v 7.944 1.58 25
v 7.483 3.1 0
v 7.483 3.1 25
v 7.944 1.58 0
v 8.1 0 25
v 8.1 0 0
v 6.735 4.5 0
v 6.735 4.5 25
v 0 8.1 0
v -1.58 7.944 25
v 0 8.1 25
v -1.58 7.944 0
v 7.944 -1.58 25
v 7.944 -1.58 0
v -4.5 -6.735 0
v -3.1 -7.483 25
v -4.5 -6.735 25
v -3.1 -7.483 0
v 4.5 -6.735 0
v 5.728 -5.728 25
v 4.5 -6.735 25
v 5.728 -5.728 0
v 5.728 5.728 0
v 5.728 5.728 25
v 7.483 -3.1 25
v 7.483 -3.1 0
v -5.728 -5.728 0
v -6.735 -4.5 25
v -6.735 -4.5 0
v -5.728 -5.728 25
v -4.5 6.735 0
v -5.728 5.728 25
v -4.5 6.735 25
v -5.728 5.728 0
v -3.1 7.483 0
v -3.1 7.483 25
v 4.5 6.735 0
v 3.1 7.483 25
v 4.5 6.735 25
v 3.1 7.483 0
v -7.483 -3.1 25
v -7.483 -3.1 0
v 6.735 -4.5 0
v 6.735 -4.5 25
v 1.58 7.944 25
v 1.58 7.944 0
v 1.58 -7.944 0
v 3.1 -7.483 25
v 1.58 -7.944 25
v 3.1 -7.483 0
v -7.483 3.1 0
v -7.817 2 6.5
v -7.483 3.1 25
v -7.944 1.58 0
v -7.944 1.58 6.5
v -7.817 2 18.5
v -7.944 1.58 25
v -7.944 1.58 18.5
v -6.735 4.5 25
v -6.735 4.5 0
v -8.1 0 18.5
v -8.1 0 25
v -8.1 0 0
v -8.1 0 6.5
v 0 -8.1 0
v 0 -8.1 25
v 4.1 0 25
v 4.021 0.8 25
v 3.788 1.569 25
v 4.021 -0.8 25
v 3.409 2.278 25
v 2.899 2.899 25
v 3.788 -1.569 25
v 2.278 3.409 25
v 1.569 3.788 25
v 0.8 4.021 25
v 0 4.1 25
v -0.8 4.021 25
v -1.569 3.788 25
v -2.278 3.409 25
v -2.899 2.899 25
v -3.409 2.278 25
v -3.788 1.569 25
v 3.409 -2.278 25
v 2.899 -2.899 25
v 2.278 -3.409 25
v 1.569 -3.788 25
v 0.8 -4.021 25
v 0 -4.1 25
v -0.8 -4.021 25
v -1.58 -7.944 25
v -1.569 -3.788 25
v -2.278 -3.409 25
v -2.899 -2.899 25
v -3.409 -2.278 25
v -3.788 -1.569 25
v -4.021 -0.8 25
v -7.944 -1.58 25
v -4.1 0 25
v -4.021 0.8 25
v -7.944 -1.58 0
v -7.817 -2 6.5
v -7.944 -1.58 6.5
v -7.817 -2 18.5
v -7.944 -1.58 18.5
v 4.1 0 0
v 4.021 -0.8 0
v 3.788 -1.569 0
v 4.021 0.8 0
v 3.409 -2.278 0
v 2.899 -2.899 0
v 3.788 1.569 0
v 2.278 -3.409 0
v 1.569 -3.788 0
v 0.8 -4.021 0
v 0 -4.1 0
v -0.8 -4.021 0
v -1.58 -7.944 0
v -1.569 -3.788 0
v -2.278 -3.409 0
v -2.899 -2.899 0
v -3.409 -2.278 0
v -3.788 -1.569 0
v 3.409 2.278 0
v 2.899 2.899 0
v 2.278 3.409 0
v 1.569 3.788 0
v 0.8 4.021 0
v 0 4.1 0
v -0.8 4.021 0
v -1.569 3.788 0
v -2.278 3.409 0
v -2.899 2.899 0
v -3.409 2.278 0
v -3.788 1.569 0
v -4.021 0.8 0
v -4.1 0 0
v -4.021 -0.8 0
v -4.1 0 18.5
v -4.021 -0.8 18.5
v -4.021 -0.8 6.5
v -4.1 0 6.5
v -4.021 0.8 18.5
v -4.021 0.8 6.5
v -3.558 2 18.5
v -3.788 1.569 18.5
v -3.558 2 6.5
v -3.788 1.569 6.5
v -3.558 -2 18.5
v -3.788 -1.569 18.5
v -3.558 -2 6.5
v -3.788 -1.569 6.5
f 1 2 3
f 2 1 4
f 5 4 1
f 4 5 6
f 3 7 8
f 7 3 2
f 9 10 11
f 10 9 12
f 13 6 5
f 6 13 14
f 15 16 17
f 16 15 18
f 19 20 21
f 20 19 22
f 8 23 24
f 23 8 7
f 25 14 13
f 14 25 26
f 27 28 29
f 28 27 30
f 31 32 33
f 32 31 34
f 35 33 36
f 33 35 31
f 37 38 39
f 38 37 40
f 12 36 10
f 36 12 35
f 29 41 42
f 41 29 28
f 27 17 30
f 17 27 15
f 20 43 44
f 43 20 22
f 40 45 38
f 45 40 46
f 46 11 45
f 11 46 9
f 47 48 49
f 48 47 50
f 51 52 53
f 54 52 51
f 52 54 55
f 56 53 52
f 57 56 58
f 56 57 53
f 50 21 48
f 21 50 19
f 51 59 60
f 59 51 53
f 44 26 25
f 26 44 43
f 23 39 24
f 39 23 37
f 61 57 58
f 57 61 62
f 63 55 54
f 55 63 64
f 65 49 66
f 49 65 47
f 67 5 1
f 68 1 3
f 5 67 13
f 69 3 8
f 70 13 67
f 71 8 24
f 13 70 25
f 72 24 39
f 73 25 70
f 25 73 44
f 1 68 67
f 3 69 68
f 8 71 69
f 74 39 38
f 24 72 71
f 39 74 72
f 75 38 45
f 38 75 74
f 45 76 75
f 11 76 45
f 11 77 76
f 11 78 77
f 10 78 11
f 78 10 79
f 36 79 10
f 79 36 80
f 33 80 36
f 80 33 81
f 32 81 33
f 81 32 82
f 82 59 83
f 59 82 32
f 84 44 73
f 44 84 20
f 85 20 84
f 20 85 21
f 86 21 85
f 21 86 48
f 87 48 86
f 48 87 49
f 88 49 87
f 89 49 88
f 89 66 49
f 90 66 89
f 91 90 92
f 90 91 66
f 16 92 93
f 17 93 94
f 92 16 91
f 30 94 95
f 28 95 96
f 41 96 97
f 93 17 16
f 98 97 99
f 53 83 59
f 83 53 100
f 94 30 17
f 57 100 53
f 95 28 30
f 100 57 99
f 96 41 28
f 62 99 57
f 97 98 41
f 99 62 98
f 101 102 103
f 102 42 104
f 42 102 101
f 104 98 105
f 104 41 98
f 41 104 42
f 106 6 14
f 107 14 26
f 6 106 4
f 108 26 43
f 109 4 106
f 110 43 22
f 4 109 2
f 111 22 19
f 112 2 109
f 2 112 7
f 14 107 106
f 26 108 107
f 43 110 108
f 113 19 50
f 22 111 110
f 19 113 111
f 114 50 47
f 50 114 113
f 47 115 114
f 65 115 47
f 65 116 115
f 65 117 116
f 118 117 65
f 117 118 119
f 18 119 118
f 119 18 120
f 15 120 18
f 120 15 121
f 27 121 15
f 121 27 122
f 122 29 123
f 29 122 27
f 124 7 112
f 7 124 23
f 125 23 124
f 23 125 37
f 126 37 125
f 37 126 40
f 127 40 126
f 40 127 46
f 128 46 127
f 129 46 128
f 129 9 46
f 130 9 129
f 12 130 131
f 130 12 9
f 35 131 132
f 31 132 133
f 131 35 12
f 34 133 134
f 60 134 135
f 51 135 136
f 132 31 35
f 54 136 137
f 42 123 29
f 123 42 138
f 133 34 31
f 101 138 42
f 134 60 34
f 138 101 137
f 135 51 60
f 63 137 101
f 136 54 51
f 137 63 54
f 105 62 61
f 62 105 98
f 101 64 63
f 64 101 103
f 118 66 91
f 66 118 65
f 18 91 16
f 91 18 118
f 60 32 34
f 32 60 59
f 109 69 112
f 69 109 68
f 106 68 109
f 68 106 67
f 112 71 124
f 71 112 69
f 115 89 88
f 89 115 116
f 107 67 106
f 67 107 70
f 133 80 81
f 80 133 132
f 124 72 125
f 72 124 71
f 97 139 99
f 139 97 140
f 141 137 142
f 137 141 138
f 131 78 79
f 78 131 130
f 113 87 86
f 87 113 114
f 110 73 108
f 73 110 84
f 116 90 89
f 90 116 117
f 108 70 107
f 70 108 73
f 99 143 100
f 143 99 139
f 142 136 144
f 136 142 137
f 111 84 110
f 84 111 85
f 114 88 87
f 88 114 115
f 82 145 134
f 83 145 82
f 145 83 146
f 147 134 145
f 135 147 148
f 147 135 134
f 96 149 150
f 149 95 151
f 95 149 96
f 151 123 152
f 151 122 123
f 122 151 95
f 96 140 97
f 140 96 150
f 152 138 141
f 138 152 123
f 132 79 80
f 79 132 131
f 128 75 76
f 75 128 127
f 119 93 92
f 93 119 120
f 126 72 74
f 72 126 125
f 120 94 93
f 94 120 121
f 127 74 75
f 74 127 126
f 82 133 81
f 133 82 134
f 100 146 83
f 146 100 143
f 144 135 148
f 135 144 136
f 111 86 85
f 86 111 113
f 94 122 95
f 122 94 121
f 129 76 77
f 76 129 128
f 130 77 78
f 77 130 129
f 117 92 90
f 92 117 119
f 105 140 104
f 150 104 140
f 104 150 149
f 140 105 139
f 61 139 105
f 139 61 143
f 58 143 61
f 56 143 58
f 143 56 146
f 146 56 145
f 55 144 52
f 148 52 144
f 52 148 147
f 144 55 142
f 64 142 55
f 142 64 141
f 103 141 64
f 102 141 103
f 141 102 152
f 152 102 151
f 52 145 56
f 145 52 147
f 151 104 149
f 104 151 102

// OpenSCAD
$fn = 32;

// ----------------------------------------------------------------------
// Spacer sleeve: 16.2 / 8.2 x 25 mm
// ----------------------------------------------------------------------

// --- parameters (mm) ---
sleeve_od = 16.2;         // outside diameter
sleeve_id = 8.2;          // shaft bore
sleeve_l = 25;            // sleeve length
slot_w = 4;               // clamp slot width
slot_len = 12;            // clamp slot length

module sleeve() {
  cylinder(h = sleeve_l, d = sleeve_od);
}

difference() {
  sleeve();
  translate([0, 0, -1]) cylinder(h = sleeve_l + 2, d = sleeve_id);
  translate([-sleeve_od / 2 - 1, -slot_w / 2, sleeve_l / 2 - slot_len / 2]) cube([sleeve_od / 2 + 1, slot_w, slot_len]);
}
